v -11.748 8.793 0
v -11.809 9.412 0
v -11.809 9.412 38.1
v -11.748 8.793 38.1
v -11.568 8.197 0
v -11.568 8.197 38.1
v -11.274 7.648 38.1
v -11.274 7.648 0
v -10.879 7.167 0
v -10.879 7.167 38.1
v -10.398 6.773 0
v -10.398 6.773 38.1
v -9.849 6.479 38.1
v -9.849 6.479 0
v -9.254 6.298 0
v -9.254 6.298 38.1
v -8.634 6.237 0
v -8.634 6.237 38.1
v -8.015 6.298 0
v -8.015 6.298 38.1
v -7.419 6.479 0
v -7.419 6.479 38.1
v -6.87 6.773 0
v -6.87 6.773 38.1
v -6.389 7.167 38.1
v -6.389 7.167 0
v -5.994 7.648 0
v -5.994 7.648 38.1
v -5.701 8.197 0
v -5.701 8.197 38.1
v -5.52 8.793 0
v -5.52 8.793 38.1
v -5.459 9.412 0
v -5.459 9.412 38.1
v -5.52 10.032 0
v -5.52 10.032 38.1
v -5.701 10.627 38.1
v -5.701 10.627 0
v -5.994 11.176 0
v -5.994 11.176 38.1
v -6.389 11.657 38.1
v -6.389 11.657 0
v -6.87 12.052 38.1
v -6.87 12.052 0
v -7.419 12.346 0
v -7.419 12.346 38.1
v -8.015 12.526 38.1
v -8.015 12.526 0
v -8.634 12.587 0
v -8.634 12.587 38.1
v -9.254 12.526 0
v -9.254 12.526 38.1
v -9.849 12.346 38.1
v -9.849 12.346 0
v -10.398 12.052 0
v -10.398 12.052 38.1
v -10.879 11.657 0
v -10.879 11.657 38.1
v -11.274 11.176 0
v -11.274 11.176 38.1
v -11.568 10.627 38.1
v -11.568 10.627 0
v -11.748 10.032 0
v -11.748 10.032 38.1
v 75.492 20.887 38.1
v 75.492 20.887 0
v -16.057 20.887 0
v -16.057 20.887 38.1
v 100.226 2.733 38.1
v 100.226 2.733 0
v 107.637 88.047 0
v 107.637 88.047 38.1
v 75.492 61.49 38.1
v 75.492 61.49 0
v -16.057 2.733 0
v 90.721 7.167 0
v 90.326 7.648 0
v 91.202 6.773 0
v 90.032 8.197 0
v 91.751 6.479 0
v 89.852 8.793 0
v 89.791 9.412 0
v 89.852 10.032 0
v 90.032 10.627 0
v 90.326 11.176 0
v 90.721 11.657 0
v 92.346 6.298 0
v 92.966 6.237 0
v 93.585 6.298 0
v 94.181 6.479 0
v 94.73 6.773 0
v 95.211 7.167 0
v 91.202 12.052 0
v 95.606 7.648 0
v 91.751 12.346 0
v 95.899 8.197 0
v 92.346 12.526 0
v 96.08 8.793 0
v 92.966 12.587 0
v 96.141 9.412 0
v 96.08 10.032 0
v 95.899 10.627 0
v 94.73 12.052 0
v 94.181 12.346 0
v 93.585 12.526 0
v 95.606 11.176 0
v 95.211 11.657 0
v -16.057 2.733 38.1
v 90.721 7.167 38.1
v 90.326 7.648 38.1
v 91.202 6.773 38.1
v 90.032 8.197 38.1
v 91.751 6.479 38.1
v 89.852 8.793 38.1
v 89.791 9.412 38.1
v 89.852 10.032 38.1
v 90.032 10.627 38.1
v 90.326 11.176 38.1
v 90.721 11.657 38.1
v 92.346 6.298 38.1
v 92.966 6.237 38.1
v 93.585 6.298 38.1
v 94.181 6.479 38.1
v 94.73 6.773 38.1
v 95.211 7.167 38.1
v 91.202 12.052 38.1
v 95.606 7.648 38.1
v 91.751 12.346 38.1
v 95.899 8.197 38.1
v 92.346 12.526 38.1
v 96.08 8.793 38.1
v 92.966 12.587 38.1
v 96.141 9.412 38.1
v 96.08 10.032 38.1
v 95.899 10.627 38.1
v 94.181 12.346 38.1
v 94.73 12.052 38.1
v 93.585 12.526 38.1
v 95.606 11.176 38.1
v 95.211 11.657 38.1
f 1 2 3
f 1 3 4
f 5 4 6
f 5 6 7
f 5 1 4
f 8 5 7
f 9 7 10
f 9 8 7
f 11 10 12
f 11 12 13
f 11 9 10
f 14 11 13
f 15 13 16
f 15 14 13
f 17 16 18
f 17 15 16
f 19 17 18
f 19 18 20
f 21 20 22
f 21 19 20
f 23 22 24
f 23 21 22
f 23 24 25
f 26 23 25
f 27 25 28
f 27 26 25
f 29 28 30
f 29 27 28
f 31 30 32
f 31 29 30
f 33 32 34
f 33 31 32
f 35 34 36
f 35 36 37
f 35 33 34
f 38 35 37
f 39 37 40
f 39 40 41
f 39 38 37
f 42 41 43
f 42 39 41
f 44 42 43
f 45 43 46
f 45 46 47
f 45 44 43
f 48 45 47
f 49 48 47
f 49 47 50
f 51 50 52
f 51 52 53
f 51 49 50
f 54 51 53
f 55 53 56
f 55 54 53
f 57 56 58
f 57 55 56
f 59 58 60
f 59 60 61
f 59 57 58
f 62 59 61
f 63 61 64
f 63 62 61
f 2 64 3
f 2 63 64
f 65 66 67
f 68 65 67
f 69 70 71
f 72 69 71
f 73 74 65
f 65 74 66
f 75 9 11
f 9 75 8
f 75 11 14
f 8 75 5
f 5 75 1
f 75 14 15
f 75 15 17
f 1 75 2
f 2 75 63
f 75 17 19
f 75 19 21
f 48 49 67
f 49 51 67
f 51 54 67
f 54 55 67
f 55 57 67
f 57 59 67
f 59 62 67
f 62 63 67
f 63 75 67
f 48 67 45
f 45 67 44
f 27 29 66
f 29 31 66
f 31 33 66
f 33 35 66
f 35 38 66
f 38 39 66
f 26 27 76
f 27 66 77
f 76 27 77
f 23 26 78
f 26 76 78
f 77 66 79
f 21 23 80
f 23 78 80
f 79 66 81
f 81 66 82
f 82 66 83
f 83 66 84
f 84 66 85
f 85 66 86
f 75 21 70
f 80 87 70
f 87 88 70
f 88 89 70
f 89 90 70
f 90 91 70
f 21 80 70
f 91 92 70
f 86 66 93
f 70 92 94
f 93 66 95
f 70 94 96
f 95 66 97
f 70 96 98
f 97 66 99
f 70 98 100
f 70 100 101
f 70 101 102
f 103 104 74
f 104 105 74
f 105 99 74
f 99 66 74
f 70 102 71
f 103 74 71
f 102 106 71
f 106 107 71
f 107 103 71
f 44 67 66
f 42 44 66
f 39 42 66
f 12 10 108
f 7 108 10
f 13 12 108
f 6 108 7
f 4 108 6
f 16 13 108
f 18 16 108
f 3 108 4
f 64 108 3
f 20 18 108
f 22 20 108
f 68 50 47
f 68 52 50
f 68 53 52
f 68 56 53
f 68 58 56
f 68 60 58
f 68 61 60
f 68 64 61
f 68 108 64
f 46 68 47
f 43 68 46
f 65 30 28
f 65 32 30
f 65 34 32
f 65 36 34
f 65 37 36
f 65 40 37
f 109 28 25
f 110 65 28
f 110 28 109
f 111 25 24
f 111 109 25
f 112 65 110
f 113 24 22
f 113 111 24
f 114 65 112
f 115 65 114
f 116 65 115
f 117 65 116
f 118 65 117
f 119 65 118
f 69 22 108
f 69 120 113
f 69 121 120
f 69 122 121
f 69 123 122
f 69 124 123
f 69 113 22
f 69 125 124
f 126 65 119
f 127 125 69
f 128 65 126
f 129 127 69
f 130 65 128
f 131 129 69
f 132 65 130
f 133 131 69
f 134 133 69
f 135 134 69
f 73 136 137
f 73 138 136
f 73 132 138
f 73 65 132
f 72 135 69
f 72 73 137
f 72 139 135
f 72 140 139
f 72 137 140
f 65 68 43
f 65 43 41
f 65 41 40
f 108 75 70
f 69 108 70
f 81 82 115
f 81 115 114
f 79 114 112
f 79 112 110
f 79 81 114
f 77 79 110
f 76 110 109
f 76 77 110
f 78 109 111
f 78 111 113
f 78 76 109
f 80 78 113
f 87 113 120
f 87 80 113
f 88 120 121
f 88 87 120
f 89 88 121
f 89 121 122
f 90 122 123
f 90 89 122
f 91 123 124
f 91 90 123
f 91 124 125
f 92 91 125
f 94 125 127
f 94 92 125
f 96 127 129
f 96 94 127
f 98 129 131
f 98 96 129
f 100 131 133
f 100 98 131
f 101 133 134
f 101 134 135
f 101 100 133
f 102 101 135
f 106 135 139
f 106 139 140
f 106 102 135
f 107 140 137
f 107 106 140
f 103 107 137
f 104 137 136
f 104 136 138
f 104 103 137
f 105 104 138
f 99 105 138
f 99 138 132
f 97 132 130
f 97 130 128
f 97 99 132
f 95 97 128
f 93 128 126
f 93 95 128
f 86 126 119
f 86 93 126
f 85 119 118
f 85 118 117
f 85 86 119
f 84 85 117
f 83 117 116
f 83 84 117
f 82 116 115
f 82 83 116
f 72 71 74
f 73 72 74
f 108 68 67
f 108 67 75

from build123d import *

# Parameters (mm, degrees)
SKETCH1_R           = 3.175
BOSS_EXTRUDE1_DEPTH = 38.1


with BuildPart() as part:
    # Sketch1 → Boss-Extrude1 (new body)
    with BuildSketch(Plane.XY):
        Polygon((-16.056683457, 2.733236781), (100.225653504, 2.733236781), (107.63663241, 88.047008638), (75.491893593, 61.490379753), (75.491893593, 20.88695082), (-16.056683457, 20.88695082), align=None)
        with Locations(Location((-8.634202411, 9.412425764, 0), (0, 0, 180))):
            Circle(SKETCH1_R, mode=Mode.SUBTRACT)
        with Locations(Location((92.965797589, 9.412425764, 0), (0, 0, 180))):
            Circle(SKETCH1_R, mode=Mode.SUBTRACT)
    extrude(amount=BOSS_EXTRUDE1_DEPTH)


solid = part.part
